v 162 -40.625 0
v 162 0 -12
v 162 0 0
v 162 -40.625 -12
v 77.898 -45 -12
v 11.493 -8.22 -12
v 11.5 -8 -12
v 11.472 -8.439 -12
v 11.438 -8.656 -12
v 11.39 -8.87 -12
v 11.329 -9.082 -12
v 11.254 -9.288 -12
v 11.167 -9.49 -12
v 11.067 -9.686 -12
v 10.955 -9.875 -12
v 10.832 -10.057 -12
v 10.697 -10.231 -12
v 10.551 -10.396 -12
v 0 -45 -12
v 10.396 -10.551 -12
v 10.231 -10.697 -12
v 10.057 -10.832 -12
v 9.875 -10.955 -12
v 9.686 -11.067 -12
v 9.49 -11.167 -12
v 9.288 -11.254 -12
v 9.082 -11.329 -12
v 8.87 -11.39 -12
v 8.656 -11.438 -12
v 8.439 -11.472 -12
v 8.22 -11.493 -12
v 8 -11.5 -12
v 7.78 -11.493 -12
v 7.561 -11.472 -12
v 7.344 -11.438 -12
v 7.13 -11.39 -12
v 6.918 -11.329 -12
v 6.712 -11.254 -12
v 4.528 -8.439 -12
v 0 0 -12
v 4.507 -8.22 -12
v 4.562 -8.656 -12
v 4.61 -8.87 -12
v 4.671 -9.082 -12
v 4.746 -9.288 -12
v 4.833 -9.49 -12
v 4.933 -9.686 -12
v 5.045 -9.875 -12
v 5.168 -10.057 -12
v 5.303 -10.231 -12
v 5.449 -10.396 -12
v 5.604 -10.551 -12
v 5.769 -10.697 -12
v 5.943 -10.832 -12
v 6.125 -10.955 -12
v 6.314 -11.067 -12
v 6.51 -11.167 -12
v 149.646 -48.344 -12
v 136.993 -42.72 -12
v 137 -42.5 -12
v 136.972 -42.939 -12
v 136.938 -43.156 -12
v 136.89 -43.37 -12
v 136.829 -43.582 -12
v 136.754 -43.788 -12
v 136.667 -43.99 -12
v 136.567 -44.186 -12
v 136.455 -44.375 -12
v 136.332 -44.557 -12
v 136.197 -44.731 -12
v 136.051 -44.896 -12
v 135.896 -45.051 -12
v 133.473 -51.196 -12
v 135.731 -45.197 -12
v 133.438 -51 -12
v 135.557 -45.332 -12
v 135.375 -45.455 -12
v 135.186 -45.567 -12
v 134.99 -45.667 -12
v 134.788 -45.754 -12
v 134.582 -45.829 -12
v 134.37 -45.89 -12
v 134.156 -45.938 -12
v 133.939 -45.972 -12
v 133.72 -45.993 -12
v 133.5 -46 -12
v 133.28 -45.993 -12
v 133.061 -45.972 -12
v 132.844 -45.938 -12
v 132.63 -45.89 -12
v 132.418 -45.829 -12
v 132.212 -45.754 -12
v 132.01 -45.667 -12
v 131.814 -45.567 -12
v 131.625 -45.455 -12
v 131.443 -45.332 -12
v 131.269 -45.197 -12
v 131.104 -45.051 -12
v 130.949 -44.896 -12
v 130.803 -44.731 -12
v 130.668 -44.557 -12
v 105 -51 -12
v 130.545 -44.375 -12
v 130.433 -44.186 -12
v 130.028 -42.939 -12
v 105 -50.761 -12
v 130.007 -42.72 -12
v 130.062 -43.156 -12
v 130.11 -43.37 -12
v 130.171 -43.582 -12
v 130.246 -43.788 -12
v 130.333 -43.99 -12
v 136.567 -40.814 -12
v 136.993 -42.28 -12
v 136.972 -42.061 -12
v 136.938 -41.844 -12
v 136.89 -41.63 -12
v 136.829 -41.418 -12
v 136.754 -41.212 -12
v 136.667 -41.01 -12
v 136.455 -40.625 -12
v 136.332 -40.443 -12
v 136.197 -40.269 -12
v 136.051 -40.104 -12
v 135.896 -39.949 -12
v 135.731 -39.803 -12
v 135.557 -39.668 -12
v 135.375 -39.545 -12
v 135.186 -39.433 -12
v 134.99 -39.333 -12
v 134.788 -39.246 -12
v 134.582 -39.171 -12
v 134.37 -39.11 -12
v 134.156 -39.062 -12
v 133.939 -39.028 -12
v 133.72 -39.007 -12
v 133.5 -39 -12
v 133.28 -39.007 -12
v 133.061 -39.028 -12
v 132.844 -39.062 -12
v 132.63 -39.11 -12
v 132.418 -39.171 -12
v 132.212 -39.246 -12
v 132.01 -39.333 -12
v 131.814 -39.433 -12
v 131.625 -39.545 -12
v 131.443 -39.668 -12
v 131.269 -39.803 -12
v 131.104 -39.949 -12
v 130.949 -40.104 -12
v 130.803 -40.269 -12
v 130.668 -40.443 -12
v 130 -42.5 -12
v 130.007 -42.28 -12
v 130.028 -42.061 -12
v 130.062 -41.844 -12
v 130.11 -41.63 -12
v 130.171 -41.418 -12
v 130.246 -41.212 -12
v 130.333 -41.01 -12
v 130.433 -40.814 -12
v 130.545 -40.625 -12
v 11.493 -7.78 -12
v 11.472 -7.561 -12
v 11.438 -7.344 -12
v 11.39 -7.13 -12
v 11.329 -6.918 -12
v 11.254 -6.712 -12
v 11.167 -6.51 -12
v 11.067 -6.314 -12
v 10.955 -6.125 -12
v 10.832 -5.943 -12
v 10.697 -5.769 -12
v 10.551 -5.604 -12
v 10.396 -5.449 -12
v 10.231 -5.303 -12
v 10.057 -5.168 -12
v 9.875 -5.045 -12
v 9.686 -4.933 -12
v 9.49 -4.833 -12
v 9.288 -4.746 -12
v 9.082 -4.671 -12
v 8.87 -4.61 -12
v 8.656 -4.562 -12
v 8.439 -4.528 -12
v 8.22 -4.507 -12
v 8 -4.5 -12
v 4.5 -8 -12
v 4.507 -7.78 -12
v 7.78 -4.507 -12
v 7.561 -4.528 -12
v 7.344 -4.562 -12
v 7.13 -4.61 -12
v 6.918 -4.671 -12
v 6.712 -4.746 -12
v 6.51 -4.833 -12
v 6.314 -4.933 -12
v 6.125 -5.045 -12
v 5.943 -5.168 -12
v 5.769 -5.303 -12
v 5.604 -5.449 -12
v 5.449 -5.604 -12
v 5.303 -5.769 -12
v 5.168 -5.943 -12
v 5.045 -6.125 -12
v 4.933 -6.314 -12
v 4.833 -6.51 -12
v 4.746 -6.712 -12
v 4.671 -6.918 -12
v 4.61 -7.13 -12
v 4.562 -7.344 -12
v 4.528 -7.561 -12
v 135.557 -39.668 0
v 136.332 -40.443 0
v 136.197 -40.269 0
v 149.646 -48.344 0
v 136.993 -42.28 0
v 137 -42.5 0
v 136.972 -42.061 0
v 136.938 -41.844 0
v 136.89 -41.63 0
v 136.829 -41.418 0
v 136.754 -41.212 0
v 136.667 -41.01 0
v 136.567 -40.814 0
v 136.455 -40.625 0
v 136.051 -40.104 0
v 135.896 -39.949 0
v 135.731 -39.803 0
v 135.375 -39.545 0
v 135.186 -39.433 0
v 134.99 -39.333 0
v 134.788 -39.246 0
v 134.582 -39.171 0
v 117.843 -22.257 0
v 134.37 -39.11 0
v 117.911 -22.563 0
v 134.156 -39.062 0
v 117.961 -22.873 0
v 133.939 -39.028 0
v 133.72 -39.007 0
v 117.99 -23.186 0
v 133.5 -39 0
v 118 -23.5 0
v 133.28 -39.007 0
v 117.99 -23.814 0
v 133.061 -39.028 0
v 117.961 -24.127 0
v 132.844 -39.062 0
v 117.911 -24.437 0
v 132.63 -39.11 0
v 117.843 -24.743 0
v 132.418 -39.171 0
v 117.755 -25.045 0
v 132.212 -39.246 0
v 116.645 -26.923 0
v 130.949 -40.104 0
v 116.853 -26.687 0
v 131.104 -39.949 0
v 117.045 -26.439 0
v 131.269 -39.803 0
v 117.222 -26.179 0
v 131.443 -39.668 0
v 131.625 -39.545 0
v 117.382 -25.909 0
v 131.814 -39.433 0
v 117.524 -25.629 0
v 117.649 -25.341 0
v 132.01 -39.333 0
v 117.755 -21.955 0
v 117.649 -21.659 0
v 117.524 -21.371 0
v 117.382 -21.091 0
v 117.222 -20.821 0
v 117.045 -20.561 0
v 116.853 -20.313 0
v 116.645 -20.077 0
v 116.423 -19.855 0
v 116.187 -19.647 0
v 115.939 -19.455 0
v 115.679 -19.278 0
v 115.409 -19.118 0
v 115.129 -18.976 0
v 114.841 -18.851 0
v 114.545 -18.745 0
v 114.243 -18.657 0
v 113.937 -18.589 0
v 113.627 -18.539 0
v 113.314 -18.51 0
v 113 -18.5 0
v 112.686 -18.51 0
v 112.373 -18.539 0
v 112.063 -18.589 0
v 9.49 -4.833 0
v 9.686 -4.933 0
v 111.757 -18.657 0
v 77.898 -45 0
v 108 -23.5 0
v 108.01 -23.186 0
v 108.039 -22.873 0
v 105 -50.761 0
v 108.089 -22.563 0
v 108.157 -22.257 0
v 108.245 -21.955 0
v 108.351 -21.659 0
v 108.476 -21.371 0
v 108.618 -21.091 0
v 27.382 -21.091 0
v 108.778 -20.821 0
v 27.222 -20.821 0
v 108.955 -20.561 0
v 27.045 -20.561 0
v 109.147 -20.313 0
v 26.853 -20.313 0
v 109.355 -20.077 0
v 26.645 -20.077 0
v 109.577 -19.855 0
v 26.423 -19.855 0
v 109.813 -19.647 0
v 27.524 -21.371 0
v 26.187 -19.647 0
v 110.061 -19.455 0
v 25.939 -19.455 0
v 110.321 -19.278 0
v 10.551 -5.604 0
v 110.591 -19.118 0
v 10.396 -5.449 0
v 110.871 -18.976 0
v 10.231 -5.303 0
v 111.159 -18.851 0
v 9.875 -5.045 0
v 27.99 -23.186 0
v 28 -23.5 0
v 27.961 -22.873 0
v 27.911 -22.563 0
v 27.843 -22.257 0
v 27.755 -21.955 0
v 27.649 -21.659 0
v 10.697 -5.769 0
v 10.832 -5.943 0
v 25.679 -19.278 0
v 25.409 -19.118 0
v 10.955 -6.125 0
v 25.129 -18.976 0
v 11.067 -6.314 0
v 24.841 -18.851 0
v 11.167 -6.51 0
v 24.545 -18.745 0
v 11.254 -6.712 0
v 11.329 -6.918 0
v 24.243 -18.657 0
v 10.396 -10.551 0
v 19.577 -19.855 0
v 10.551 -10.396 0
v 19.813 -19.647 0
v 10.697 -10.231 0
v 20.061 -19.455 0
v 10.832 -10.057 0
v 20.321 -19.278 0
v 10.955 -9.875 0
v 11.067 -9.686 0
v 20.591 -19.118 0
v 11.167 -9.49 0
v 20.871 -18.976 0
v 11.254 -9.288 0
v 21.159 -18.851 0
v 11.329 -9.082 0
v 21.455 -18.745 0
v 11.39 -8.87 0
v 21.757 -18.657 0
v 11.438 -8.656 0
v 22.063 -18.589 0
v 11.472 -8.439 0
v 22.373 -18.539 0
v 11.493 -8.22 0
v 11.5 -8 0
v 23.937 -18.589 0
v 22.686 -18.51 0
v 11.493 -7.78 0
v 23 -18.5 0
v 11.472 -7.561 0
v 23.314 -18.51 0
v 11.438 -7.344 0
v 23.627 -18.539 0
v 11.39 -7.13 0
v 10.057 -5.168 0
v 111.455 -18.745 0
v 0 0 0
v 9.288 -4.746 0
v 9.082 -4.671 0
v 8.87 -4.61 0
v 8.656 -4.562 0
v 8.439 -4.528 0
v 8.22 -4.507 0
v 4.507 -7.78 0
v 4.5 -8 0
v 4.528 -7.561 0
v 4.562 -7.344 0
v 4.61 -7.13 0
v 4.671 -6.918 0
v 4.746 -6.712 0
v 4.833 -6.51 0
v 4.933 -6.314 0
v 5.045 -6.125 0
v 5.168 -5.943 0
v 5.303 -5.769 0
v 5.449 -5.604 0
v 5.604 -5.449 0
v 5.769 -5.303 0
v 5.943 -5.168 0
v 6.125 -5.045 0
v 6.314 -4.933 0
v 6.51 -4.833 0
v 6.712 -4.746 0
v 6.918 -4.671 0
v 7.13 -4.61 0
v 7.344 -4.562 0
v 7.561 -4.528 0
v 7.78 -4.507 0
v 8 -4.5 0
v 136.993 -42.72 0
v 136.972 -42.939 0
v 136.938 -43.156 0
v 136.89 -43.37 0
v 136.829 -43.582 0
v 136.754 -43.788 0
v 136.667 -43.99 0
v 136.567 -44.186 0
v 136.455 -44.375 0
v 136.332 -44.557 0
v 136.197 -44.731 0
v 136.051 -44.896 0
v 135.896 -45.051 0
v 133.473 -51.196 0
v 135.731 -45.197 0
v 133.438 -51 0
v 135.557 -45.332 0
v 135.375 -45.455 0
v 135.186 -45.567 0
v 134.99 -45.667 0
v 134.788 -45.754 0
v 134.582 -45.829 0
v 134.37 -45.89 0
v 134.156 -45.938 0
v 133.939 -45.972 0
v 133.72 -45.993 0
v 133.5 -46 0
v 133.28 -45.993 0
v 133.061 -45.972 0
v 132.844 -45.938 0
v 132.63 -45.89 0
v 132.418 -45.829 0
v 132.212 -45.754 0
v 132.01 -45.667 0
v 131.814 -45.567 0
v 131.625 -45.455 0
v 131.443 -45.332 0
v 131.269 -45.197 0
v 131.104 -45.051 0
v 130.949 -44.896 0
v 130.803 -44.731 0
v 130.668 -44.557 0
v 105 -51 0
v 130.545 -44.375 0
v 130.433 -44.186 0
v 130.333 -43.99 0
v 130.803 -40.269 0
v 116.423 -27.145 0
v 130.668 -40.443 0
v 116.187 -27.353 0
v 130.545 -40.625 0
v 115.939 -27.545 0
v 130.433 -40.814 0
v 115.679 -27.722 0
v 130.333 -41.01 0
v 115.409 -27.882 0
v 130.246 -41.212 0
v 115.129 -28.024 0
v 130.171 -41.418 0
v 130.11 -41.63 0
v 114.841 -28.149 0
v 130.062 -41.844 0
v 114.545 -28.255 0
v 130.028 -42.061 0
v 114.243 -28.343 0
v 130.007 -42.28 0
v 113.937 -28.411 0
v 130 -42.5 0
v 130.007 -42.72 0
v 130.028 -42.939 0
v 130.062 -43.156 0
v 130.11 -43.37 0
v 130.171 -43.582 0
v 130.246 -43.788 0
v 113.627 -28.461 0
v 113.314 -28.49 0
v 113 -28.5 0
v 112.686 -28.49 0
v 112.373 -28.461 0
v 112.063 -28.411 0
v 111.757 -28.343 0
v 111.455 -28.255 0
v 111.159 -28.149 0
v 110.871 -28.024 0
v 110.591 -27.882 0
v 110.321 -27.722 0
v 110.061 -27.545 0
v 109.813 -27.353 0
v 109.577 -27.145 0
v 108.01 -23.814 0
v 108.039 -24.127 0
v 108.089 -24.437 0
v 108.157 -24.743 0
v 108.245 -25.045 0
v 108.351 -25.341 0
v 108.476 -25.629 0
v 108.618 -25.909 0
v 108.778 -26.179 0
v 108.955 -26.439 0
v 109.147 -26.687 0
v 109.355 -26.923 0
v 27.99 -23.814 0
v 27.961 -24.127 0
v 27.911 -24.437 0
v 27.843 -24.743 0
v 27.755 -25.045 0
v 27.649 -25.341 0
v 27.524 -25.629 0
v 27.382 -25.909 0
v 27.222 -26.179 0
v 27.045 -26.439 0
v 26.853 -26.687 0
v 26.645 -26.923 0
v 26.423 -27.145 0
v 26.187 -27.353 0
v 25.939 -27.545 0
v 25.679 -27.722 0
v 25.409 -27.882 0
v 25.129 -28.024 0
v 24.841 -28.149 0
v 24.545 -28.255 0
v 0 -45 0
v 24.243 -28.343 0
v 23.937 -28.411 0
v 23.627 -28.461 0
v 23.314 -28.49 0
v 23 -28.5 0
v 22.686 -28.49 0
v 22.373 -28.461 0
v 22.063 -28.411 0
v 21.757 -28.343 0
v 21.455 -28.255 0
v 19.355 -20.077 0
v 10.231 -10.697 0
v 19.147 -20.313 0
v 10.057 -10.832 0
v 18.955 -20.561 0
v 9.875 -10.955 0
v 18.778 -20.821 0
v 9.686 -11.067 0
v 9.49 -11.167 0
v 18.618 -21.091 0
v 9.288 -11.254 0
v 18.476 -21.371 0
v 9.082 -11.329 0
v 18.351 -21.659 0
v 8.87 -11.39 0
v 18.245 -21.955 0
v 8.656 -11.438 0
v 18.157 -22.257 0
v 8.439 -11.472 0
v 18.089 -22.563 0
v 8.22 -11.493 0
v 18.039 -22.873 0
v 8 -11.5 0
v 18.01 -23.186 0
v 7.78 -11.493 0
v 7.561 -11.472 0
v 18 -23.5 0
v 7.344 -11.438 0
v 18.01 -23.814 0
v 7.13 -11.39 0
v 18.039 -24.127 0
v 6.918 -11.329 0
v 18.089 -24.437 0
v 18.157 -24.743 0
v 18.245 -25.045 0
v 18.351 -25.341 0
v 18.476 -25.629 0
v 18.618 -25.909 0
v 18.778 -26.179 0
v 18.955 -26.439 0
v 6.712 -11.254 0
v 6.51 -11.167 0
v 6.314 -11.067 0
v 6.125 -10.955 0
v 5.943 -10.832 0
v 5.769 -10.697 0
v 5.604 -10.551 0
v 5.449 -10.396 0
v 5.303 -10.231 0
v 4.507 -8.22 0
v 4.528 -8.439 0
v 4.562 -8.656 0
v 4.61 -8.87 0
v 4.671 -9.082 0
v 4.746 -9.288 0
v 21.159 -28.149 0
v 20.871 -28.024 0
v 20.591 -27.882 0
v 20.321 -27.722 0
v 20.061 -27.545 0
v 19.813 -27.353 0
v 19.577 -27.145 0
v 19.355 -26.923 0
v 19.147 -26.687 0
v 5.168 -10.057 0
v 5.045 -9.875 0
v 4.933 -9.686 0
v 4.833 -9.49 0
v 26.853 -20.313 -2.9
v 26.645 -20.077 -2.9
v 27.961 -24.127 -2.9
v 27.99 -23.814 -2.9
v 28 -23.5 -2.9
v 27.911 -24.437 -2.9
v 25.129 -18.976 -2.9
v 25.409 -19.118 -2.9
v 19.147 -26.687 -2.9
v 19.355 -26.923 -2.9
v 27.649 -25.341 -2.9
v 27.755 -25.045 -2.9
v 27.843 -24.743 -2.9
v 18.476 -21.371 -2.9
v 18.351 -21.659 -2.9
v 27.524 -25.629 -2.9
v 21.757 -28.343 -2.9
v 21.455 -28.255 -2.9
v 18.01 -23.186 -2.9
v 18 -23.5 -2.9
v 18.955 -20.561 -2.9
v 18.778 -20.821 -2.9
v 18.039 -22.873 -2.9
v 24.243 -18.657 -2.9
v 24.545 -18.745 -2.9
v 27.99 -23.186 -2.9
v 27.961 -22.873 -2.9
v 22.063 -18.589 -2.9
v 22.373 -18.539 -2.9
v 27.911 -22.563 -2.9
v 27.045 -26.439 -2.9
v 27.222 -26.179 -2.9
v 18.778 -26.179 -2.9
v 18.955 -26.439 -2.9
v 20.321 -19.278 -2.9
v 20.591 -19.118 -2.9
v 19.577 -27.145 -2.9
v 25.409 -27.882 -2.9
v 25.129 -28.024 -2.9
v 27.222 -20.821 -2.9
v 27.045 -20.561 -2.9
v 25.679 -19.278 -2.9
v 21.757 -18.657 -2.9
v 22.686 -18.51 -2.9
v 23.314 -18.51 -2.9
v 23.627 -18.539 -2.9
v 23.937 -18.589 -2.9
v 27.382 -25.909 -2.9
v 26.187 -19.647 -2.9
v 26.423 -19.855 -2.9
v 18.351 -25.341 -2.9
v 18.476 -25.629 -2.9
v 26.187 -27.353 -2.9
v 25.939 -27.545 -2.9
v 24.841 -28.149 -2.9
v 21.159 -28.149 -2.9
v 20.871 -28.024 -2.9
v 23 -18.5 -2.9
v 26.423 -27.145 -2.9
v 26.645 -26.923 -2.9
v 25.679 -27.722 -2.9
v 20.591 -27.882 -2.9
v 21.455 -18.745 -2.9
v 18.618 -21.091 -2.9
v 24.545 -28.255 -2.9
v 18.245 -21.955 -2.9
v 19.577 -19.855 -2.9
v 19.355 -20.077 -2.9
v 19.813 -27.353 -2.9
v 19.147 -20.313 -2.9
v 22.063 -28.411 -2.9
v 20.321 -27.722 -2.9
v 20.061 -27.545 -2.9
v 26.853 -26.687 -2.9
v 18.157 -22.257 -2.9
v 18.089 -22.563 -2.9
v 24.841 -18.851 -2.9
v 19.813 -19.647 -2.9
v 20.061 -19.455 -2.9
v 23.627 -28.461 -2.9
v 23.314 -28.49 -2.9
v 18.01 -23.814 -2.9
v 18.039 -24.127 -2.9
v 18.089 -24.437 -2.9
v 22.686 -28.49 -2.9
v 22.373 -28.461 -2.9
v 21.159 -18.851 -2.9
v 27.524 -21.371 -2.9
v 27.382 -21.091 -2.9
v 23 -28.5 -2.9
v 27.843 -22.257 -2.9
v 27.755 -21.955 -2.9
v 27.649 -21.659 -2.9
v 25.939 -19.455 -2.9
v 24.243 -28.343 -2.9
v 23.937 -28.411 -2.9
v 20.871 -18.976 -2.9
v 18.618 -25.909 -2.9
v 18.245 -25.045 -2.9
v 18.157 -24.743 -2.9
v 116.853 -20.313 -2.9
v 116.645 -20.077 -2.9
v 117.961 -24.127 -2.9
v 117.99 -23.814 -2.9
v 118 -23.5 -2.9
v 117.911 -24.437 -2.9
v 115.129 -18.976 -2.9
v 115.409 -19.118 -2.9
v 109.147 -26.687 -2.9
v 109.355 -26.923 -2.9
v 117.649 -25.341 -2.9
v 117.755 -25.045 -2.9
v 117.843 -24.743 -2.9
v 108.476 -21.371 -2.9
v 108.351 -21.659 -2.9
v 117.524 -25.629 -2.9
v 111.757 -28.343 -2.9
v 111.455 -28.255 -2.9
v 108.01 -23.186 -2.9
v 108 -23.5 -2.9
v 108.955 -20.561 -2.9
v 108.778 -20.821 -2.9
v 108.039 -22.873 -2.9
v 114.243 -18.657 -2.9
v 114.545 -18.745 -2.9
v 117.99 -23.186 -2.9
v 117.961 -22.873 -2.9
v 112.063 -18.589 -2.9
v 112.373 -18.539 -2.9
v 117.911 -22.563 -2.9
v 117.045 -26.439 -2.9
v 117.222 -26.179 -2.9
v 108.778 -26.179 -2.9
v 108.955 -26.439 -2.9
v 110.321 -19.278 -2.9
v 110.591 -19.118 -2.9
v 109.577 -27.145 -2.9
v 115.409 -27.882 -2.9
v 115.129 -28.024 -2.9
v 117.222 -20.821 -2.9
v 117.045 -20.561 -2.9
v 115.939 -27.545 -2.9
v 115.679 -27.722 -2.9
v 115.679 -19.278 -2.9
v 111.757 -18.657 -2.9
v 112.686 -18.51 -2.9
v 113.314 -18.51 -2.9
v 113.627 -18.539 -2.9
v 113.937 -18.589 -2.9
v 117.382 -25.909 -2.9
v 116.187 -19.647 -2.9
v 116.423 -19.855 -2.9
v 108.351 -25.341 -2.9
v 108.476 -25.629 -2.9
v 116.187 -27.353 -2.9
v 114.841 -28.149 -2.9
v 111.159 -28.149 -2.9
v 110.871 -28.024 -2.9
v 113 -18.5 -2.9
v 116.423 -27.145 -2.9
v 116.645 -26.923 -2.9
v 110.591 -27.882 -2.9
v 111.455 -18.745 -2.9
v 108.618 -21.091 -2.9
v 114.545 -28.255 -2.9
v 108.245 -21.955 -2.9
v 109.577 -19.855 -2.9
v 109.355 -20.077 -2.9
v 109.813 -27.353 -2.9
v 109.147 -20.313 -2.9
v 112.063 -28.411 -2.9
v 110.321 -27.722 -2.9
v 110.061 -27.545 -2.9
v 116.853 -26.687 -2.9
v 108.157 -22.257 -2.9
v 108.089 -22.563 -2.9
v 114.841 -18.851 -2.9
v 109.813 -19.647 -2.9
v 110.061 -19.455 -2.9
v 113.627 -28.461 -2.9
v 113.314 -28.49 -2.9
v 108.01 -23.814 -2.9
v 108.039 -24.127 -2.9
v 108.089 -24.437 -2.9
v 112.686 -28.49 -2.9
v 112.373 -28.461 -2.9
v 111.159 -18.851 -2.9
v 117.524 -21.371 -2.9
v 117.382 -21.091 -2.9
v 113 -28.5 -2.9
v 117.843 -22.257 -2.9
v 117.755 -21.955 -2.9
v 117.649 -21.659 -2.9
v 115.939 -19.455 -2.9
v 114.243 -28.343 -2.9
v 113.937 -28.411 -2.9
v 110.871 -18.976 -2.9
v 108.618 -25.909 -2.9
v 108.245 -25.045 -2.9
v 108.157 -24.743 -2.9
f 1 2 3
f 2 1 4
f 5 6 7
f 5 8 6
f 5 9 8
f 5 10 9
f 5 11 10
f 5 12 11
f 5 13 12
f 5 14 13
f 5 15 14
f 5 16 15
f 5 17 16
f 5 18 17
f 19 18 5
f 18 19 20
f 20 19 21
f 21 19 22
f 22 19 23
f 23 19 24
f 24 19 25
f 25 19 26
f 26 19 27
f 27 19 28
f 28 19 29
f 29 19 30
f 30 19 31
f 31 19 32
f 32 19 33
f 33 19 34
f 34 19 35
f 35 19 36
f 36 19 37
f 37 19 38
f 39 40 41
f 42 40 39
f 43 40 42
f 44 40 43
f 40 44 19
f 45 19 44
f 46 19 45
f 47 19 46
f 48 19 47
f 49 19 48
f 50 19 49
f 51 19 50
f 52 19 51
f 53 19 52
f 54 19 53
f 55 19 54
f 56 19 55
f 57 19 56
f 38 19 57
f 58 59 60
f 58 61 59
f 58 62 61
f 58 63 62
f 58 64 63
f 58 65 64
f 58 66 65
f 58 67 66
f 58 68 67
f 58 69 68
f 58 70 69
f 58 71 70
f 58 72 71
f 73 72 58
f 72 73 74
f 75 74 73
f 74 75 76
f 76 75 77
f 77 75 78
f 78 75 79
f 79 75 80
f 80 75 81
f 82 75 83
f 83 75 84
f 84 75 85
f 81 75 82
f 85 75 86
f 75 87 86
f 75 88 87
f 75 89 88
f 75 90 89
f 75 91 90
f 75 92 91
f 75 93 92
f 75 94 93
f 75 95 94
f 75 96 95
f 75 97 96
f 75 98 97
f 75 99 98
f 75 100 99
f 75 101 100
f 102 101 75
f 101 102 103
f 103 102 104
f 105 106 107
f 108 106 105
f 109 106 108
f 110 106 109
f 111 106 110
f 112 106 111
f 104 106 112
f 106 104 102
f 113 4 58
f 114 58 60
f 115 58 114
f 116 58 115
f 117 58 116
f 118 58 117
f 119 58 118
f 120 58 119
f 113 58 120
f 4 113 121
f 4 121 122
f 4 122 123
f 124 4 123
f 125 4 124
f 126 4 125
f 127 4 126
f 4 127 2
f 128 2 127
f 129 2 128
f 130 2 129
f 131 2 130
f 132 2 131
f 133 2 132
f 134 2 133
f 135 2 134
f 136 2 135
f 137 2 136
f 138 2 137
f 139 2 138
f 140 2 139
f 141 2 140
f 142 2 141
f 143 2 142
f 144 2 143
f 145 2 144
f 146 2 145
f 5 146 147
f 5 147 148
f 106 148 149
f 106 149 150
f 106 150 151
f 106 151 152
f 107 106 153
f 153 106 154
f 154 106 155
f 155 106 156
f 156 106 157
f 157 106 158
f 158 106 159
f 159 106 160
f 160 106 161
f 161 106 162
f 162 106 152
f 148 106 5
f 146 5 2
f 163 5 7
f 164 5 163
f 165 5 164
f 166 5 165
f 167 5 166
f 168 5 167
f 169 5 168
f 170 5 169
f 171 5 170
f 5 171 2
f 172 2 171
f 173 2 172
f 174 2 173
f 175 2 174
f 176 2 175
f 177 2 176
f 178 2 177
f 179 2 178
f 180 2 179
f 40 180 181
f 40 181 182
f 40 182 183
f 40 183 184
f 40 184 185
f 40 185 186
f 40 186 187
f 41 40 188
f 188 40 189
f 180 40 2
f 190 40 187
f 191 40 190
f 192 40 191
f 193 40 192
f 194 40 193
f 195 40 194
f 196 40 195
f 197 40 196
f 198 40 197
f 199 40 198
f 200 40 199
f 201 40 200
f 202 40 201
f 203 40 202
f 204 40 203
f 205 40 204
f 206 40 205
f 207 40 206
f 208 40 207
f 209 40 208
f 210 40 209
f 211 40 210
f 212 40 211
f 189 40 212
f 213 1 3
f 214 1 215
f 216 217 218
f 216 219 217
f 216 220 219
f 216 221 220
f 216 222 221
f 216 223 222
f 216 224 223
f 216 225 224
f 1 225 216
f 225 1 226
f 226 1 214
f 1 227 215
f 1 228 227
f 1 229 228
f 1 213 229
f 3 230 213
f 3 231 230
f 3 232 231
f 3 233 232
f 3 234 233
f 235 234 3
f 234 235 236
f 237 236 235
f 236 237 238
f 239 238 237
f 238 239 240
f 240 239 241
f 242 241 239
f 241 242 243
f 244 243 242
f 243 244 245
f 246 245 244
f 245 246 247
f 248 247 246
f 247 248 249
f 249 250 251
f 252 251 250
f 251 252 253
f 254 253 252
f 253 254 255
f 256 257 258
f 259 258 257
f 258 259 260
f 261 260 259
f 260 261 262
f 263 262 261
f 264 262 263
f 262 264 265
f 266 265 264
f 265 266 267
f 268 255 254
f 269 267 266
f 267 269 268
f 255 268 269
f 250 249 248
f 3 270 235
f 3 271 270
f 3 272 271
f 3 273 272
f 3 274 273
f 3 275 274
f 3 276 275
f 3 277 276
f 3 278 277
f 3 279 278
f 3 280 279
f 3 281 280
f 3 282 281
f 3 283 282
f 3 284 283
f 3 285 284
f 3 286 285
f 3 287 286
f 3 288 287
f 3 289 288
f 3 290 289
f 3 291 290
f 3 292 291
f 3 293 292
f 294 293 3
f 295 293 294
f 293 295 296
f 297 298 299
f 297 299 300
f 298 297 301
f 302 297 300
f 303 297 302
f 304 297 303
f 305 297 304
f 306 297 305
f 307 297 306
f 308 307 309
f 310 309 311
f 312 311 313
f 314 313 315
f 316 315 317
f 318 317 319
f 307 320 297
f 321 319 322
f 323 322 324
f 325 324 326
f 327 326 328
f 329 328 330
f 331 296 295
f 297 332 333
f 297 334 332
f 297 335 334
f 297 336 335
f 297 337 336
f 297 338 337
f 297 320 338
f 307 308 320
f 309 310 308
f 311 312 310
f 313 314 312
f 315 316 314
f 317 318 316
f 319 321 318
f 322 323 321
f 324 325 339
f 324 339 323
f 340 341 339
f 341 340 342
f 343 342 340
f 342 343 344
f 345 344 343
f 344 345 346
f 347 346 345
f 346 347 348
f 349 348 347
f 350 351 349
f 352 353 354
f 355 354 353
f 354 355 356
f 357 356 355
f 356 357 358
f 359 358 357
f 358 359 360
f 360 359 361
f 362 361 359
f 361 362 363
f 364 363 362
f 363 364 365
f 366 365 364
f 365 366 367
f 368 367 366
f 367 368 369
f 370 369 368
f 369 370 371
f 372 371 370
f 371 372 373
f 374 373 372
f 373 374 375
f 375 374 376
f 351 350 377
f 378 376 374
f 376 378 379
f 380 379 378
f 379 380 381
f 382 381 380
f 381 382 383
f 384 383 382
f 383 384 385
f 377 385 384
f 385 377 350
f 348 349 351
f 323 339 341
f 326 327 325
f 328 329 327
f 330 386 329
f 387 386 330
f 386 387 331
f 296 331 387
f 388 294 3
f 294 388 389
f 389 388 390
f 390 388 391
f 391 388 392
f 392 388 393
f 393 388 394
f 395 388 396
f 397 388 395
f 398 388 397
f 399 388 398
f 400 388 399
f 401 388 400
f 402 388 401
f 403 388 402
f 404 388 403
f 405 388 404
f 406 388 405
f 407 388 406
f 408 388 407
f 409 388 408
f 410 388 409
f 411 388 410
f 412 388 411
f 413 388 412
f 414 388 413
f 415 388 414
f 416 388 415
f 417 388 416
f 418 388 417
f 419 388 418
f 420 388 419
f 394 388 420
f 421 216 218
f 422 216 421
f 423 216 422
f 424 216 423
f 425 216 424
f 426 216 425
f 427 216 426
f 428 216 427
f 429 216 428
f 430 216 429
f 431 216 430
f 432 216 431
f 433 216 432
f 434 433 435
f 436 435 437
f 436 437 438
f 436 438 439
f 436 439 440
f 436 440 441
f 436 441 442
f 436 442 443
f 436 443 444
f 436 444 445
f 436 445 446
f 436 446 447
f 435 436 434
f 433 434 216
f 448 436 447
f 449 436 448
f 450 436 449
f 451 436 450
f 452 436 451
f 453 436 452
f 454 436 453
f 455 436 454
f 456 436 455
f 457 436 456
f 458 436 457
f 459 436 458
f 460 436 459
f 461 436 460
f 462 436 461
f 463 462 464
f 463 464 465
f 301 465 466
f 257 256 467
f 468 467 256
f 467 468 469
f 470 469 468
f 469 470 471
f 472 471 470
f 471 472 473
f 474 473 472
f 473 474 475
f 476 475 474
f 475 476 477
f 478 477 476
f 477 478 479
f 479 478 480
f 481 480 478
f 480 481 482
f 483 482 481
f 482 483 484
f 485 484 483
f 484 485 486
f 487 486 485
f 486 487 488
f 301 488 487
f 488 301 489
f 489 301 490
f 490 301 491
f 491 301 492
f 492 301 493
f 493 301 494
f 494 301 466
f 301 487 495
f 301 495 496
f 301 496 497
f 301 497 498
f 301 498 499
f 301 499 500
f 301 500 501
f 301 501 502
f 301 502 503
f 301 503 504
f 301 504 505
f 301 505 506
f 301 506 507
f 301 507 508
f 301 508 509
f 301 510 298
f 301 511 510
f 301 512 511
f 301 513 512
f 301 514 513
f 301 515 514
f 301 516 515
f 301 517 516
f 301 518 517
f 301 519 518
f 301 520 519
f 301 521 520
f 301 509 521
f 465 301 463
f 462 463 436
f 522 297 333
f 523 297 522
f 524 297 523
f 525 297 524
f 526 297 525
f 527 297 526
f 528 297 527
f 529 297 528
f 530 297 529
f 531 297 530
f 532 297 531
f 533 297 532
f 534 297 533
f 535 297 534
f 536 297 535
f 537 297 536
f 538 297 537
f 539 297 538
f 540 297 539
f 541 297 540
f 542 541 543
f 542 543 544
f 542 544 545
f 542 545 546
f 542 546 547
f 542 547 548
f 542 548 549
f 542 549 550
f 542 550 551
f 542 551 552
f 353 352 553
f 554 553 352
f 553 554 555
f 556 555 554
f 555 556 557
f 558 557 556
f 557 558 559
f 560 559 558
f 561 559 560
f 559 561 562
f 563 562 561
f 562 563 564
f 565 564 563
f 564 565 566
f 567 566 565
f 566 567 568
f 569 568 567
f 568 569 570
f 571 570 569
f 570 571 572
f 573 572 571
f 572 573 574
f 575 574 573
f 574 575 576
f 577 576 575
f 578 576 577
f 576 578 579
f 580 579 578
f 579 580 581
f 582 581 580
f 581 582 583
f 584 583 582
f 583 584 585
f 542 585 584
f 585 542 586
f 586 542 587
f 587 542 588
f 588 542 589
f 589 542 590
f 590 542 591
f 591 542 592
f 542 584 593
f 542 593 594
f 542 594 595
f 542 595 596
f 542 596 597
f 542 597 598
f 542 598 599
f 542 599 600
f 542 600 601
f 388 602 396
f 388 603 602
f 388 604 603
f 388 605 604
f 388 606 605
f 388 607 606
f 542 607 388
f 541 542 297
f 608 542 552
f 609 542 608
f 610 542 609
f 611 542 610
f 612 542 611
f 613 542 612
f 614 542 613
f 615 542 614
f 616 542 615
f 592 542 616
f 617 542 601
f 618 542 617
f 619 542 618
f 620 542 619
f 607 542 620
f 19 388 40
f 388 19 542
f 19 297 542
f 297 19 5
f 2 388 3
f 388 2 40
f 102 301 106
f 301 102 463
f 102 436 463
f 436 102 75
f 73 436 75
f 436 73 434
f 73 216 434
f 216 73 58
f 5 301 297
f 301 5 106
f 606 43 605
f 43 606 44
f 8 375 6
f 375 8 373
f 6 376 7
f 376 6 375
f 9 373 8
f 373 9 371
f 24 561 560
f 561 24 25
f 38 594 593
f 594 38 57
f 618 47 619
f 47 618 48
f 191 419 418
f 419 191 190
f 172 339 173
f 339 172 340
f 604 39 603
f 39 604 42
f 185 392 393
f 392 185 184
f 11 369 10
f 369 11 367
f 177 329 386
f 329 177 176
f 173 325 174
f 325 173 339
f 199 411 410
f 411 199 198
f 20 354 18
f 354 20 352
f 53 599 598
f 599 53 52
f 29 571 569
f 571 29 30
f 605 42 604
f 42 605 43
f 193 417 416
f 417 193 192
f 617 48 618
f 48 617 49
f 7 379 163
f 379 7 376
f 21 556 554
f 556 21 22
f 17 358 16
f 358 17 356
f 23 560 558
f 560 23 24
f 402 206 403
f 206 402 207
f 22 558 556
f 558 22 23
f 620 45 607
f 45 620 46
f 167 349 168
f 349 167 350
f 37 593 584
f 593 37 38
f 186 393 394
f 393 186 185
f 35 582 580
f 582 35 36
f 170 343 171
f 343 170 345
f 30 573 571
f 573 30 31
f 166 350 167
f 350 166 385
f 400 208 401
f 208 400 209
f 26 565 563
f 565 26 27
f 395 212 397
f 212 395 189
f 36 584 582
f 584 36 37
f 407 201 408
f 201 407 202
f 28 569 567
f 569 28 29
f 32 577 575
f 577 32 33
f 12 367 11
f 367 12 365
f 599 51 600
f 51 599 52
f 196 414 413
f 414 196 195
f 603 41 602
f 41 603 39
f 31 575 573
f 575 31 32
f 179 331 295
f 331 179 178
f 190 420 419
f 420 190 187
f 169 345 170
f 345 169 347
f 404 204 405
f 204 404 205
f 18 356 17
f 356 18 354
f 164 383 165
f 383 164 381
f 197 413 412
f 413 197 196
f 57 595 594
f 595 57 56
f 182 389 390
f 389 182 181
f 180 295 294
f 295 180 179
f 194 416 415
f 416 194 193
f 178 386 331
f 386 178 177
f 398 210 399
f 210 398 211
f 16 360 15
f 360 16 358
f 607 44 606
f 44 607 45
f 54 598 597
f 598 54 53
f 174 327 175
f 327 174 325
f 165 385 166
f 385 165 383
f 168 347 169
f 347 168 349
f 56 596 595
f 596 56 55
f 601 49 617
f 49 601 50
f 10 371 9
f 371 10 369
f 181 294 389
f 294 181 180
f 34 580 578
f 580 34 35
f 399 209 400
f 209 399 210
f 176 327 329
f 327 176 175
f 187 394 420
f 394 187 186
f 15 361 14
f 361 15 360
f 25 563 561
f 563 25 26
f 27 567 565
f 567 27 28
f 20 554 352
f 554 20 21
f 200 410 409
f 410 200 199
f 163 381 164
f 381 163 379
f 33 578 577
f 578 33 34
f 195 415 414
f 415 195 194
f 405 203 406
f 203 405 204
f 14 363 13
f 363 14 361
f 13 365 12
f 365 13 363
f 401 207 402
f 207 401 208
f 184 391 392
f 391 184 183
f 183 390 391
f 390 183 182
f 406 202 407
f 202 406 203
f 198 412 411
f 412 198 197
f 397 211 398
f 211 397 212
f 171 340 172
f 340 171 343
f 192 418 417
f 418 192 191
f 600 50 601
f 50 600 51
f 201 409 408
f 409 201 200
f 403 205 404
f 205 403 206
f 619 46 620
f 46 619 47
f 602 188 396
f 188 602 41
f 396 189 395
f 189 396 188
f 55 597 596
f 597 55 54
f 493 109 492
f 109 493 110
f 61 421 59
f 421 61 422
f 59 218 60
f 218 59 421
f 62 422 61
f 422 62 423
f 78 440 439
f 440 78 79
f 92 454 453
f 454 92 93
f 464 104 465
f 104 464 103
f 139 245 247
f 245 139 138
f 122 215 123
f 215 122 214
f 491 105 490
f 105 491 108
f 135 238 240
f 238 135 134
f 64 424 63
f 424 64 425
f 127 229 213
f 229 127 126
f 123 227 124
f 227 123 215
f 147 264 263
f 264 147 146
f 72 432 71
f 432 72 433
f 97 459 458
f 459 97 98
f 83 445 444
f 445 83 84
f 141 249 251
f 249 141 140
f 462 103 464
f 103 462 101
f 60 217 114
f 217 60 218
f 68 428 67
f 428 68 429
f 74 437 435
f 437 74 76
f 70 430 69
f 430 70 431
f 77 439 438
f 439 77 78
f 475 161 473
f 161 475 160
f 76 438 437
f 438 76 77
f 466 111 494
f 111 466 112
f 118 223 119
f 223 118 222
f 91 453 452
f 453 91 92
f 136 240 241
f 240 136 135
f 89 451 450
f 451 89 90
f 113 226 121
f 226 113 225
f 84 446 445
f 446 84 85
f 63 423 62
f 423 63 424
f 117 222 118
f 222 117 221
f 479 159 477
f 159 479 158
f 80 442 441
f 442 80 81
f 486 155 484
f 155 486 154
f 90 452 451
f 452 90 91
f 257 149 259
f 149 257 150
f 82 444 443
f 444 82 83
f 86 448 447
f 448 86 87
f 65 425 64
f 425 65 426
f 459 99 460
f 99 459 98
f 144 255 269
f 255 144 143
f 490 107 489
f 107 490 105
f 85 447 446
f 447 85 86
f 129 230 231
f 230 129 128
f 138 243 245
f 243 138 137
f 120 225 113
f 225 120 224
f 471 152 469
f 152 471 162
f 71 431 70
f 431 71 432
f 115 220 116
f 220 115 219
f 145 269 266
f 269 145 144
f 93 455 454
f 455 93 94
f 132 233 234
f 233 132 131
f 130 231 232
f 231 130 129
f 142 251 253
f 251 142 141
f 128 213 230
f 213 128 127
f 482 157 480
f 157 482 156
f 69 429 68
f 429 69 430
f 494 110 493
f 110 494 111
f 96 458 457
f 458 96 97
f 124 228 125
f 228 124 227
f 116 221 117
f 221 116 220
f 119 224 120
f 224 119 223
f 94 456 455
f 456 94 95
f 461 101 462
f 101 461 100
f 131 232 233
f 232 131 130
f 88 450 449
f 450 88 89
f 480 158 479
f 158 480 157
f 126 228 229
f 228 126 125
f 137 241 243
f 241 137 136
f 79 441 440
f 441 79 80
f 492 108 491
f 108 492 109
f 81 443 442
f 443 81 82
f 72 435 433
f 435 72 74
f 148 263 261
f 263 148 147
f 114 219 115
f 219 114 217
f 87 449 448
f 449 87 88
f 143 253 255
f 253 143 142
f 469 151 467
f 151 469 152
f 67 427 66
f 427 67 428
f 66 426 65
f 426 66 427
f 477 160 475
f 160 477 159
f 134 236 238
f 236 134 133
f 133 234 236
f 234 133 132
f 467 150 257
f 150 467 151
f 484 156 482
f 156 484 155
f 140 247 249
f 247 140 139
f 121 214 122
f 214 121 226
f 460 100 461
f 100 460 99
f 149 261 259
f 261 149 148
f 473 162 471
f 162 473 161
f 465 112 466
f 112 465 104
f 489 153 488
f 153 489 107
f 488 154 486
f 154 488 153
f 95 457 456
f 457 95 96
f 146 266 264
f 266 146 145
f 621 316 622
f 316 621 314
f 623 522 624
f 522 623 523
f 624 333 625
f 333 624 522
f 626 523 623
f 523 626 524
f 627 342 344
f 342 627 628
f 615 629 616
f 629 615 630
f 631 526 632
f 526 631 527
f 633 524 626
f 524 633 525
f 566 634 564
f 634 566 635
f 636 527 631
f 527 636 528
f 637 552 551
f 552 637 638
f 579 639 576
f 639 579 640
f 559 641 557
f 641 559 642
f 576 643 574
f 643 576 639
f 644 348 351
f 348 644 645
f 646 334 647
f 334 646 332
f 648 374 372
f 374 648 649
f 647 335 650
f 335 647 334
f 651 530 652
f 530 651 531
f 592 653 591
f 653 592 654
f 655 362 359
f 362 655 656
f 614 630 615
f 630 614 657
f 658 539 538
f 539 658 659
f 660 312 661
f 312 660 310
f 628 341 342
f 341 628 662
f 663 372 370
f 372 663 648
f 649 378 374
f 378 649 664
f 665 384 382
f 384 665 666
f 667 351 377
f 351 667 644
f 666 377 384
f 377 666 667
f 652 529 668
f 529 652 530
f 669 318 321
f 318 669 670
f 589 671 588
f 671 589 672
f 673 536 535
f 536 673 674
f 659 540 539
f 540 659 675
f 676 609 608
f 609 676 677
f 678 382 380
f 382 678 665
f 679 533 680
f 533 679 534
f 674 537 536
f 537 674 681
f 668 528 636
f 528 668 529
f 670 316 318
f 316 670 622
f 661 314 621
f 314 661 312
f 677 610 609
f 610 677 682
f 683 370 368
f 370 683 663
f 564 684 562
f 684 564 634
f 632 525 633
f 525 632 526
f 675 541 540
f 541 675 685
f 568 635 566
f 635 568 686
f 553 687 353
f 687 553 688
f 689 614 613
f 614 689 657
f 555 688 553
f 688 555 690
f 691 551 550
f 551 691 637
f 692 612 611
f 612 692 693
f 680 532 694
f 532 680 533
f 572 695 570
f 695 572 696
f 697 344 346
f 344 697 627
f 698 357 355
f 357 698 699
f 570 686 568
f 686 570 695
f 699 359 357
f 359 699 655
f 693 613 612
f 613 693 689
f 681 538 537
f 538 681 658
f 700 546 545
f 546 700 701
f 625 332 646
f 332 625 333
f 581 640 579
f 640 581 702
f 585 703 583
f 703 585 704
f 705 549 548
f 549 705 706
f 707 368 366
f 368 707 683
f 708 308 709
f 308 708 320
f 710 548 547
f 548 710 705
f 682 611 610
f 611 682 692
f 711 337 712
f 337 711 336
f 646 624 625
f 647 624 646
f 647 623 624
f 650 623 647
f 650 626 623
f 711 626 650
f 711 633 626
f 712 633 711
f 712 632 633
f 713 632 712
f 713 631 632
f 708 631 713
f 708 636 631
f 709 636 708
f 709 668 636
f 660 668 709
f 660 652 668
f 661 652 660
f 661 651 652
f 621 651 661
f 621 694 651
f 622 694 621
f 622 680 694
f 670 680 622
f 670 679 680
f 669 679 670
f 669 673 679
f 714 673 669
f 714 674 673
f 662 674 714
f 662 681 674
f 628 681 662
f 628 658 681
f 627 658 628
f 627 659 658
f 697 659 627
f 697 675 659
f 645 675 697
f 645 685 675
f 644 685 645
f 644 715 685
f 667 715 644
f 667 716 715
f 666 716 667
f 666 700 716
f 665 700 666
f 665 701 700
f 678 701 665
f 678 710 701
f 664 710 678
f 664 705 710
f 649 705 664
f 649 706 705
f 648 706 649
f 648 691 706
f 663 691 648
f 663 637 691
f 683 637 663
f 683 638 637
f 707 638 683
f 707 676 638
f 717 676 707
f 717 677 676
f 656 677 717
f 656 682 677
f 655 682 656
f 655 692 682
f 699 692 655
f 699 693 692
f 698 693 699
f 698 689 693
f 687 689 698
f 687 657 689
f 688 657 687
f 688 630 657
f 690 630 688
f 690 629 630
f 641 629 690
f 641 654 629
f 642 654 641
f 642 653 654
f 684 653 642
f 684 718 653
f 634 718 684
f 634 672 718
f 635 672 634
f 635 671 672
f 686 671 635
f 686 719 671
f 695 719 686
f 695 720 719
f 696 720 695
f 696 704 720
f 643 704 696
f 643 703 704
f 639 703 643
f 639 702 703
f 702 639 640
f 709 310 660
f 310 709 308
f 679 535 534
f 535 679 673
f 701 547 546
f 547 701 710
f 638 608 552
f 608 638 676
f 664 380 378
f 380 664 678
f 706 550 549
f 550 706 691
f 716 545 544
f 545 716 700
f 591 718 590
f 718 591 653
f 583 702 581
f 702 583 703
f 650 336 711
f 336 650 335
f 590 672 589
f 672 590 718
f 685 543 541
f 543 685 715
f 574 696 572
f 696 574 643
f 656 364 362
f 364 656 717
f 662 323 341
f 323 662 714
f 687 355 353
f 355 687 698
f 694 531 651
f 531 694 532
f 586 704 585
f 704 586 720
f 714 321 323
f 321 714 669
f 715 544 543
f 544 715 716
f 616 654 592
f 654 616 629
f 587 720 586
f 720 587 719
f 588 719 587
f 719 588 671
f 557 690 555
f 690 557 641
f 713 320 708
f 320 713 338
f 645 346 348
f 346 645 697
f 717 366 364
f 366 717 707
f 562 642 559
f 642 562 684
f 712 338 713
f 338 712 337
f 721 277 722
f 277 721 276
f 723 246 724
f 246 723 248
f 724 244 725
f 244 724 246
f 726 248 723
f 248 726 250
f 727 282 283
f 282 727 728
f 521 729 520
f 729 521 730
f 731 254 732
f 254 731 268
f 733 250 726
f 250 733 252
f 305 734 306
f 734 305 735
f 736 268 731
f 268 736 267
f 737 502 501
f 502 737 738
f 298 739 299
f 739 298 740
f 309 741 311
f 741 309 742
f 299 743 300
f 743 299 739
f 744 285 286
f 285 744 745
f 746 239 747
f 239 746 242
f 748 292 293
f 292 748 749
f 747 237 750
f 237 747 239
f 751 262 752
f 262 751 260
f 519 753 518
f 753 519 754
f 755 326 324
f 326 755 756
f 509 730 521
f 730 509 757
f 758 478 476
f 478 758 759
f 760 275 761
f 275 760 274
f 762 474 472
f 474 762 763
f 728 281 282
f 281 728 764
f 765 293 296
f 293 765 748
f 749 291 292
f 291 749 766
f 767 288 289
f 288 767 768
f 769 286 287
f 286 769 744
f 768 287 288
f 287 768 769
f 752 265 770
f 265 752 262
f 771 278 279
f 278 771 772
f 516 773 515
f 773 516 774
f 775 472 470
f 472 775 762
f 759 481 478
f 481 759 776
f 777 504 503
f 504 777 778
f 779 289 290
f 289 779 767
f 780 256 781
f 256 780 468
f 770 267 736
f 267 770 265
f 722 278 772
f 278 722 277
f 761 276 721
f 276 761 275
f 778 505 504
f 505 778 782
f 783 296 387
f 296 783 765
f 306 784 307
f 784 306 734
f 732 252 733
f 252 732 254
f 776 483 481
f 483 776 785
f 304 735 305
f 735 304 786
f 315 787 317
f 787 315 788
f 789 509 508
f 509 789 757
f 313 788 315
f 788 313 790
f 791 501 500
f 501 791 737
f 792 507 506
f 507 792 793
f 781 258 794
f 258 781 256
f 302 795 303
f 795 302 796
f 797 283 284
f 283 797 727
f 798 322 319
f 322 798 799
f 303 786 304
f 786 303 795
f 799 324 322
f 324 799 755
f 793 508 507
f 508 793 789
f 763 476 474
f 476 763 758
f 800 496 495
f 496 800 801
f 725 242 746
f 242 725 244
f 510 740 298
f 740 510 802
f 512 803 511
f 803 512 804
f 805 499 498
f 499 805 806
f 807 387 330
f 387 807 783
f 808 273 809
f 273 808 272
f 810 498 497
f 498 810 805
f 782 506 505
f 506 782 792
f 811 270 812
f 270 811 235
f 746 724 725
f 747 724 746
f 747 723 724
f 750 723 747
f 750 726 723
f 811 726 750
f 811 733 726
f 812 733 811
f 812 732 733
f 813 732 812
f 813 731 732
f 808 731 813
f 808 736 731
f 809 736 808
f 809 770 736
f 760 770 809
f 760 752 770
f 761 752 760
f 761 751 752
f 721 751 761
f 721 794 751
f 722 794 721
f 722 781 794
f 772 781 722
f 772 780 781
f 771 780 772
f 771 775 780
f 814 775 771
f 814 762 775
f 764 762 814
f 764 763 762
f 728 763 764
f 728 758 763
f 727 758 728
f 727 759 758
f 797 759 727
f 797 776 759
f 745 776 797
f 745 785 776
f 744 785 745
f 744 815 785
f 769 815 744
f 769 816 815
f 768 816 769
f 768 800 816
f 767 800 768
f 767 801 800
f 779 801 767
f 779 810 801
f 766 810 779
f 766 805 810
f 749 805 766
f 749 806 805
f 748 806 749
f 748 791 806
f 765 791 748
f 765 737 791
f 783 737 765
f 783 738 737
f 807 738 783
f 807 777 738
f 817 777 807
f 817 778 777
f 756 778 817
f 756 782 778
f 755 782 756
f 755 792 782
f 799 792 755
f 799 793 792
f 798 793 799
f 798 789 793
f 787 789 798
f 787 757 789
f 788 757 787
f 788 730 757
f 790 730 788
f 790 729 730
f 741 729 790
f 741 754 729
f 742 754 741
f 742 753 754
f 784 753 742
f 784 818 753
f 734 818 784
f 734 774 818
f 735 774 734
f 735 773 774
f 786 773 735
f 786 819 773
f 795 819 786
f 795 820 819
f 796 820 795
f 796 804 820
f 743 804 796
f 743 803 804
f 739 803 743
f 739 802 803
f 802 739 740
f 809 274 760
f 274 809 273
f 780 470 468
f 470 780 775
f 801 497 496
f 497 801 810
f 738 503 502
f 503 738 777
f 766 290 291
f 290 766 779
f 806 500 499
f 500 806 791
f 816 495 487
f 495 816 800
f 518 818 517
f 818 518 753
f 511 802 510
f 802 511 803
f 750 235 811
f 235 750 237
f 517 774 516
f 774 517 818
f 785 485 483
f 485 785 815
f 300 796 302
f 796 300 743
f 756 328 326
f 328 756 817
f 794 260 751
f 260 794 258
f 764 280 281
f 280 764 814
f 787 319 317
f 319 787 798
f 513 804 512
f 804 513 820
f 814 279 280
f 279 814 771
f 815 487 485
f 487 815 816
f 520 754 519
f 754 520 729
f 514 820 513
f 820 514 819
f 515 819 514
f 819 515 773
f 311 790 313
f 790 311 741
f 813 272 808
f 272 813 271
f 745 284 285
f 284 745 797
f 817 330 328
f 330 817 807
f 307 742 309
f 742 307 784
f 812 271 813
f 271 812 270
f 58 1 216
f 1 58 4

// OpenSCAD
//This will increase the thickness of the part, in mm.
Part_Thickness = 12;

//This will change the raidus of the bolt holes, in mm.
Thread_Radius = 3.5;

rotate([180, 0, 0])union(){difference(){union(){difference(){union(){cube([162, 45, Part_Thickness]);
translate([105, -0, 0])cube([28.5, 51, Part_Thickness]);
translate([130, 31.5, 0])rotate([0,0, -10])cube([29, 20, Part_Thickness]);
translate([80, 25, 0])rotate([0,0, 12])cube([30, 20, Part_Thickness]);}


union(){translate([8, 8, -0.5])cylinder(r=Thread_Radius, h=20, $fn=100);
translate([133.5, 42.5, -0.5])cylinder(r=Thread_Radius, h=20, $fn=100);

translate([23, 23.5, -0.1])cylinder(r=5, h=3, $fn=100);
translate([113, 23.5, -0.1])cylinder(r=5, h=3, $fn=100);
translate([163, 40, -1])rotate([0, 0, 58])cube([5, 16, 20]);}}}

}}
